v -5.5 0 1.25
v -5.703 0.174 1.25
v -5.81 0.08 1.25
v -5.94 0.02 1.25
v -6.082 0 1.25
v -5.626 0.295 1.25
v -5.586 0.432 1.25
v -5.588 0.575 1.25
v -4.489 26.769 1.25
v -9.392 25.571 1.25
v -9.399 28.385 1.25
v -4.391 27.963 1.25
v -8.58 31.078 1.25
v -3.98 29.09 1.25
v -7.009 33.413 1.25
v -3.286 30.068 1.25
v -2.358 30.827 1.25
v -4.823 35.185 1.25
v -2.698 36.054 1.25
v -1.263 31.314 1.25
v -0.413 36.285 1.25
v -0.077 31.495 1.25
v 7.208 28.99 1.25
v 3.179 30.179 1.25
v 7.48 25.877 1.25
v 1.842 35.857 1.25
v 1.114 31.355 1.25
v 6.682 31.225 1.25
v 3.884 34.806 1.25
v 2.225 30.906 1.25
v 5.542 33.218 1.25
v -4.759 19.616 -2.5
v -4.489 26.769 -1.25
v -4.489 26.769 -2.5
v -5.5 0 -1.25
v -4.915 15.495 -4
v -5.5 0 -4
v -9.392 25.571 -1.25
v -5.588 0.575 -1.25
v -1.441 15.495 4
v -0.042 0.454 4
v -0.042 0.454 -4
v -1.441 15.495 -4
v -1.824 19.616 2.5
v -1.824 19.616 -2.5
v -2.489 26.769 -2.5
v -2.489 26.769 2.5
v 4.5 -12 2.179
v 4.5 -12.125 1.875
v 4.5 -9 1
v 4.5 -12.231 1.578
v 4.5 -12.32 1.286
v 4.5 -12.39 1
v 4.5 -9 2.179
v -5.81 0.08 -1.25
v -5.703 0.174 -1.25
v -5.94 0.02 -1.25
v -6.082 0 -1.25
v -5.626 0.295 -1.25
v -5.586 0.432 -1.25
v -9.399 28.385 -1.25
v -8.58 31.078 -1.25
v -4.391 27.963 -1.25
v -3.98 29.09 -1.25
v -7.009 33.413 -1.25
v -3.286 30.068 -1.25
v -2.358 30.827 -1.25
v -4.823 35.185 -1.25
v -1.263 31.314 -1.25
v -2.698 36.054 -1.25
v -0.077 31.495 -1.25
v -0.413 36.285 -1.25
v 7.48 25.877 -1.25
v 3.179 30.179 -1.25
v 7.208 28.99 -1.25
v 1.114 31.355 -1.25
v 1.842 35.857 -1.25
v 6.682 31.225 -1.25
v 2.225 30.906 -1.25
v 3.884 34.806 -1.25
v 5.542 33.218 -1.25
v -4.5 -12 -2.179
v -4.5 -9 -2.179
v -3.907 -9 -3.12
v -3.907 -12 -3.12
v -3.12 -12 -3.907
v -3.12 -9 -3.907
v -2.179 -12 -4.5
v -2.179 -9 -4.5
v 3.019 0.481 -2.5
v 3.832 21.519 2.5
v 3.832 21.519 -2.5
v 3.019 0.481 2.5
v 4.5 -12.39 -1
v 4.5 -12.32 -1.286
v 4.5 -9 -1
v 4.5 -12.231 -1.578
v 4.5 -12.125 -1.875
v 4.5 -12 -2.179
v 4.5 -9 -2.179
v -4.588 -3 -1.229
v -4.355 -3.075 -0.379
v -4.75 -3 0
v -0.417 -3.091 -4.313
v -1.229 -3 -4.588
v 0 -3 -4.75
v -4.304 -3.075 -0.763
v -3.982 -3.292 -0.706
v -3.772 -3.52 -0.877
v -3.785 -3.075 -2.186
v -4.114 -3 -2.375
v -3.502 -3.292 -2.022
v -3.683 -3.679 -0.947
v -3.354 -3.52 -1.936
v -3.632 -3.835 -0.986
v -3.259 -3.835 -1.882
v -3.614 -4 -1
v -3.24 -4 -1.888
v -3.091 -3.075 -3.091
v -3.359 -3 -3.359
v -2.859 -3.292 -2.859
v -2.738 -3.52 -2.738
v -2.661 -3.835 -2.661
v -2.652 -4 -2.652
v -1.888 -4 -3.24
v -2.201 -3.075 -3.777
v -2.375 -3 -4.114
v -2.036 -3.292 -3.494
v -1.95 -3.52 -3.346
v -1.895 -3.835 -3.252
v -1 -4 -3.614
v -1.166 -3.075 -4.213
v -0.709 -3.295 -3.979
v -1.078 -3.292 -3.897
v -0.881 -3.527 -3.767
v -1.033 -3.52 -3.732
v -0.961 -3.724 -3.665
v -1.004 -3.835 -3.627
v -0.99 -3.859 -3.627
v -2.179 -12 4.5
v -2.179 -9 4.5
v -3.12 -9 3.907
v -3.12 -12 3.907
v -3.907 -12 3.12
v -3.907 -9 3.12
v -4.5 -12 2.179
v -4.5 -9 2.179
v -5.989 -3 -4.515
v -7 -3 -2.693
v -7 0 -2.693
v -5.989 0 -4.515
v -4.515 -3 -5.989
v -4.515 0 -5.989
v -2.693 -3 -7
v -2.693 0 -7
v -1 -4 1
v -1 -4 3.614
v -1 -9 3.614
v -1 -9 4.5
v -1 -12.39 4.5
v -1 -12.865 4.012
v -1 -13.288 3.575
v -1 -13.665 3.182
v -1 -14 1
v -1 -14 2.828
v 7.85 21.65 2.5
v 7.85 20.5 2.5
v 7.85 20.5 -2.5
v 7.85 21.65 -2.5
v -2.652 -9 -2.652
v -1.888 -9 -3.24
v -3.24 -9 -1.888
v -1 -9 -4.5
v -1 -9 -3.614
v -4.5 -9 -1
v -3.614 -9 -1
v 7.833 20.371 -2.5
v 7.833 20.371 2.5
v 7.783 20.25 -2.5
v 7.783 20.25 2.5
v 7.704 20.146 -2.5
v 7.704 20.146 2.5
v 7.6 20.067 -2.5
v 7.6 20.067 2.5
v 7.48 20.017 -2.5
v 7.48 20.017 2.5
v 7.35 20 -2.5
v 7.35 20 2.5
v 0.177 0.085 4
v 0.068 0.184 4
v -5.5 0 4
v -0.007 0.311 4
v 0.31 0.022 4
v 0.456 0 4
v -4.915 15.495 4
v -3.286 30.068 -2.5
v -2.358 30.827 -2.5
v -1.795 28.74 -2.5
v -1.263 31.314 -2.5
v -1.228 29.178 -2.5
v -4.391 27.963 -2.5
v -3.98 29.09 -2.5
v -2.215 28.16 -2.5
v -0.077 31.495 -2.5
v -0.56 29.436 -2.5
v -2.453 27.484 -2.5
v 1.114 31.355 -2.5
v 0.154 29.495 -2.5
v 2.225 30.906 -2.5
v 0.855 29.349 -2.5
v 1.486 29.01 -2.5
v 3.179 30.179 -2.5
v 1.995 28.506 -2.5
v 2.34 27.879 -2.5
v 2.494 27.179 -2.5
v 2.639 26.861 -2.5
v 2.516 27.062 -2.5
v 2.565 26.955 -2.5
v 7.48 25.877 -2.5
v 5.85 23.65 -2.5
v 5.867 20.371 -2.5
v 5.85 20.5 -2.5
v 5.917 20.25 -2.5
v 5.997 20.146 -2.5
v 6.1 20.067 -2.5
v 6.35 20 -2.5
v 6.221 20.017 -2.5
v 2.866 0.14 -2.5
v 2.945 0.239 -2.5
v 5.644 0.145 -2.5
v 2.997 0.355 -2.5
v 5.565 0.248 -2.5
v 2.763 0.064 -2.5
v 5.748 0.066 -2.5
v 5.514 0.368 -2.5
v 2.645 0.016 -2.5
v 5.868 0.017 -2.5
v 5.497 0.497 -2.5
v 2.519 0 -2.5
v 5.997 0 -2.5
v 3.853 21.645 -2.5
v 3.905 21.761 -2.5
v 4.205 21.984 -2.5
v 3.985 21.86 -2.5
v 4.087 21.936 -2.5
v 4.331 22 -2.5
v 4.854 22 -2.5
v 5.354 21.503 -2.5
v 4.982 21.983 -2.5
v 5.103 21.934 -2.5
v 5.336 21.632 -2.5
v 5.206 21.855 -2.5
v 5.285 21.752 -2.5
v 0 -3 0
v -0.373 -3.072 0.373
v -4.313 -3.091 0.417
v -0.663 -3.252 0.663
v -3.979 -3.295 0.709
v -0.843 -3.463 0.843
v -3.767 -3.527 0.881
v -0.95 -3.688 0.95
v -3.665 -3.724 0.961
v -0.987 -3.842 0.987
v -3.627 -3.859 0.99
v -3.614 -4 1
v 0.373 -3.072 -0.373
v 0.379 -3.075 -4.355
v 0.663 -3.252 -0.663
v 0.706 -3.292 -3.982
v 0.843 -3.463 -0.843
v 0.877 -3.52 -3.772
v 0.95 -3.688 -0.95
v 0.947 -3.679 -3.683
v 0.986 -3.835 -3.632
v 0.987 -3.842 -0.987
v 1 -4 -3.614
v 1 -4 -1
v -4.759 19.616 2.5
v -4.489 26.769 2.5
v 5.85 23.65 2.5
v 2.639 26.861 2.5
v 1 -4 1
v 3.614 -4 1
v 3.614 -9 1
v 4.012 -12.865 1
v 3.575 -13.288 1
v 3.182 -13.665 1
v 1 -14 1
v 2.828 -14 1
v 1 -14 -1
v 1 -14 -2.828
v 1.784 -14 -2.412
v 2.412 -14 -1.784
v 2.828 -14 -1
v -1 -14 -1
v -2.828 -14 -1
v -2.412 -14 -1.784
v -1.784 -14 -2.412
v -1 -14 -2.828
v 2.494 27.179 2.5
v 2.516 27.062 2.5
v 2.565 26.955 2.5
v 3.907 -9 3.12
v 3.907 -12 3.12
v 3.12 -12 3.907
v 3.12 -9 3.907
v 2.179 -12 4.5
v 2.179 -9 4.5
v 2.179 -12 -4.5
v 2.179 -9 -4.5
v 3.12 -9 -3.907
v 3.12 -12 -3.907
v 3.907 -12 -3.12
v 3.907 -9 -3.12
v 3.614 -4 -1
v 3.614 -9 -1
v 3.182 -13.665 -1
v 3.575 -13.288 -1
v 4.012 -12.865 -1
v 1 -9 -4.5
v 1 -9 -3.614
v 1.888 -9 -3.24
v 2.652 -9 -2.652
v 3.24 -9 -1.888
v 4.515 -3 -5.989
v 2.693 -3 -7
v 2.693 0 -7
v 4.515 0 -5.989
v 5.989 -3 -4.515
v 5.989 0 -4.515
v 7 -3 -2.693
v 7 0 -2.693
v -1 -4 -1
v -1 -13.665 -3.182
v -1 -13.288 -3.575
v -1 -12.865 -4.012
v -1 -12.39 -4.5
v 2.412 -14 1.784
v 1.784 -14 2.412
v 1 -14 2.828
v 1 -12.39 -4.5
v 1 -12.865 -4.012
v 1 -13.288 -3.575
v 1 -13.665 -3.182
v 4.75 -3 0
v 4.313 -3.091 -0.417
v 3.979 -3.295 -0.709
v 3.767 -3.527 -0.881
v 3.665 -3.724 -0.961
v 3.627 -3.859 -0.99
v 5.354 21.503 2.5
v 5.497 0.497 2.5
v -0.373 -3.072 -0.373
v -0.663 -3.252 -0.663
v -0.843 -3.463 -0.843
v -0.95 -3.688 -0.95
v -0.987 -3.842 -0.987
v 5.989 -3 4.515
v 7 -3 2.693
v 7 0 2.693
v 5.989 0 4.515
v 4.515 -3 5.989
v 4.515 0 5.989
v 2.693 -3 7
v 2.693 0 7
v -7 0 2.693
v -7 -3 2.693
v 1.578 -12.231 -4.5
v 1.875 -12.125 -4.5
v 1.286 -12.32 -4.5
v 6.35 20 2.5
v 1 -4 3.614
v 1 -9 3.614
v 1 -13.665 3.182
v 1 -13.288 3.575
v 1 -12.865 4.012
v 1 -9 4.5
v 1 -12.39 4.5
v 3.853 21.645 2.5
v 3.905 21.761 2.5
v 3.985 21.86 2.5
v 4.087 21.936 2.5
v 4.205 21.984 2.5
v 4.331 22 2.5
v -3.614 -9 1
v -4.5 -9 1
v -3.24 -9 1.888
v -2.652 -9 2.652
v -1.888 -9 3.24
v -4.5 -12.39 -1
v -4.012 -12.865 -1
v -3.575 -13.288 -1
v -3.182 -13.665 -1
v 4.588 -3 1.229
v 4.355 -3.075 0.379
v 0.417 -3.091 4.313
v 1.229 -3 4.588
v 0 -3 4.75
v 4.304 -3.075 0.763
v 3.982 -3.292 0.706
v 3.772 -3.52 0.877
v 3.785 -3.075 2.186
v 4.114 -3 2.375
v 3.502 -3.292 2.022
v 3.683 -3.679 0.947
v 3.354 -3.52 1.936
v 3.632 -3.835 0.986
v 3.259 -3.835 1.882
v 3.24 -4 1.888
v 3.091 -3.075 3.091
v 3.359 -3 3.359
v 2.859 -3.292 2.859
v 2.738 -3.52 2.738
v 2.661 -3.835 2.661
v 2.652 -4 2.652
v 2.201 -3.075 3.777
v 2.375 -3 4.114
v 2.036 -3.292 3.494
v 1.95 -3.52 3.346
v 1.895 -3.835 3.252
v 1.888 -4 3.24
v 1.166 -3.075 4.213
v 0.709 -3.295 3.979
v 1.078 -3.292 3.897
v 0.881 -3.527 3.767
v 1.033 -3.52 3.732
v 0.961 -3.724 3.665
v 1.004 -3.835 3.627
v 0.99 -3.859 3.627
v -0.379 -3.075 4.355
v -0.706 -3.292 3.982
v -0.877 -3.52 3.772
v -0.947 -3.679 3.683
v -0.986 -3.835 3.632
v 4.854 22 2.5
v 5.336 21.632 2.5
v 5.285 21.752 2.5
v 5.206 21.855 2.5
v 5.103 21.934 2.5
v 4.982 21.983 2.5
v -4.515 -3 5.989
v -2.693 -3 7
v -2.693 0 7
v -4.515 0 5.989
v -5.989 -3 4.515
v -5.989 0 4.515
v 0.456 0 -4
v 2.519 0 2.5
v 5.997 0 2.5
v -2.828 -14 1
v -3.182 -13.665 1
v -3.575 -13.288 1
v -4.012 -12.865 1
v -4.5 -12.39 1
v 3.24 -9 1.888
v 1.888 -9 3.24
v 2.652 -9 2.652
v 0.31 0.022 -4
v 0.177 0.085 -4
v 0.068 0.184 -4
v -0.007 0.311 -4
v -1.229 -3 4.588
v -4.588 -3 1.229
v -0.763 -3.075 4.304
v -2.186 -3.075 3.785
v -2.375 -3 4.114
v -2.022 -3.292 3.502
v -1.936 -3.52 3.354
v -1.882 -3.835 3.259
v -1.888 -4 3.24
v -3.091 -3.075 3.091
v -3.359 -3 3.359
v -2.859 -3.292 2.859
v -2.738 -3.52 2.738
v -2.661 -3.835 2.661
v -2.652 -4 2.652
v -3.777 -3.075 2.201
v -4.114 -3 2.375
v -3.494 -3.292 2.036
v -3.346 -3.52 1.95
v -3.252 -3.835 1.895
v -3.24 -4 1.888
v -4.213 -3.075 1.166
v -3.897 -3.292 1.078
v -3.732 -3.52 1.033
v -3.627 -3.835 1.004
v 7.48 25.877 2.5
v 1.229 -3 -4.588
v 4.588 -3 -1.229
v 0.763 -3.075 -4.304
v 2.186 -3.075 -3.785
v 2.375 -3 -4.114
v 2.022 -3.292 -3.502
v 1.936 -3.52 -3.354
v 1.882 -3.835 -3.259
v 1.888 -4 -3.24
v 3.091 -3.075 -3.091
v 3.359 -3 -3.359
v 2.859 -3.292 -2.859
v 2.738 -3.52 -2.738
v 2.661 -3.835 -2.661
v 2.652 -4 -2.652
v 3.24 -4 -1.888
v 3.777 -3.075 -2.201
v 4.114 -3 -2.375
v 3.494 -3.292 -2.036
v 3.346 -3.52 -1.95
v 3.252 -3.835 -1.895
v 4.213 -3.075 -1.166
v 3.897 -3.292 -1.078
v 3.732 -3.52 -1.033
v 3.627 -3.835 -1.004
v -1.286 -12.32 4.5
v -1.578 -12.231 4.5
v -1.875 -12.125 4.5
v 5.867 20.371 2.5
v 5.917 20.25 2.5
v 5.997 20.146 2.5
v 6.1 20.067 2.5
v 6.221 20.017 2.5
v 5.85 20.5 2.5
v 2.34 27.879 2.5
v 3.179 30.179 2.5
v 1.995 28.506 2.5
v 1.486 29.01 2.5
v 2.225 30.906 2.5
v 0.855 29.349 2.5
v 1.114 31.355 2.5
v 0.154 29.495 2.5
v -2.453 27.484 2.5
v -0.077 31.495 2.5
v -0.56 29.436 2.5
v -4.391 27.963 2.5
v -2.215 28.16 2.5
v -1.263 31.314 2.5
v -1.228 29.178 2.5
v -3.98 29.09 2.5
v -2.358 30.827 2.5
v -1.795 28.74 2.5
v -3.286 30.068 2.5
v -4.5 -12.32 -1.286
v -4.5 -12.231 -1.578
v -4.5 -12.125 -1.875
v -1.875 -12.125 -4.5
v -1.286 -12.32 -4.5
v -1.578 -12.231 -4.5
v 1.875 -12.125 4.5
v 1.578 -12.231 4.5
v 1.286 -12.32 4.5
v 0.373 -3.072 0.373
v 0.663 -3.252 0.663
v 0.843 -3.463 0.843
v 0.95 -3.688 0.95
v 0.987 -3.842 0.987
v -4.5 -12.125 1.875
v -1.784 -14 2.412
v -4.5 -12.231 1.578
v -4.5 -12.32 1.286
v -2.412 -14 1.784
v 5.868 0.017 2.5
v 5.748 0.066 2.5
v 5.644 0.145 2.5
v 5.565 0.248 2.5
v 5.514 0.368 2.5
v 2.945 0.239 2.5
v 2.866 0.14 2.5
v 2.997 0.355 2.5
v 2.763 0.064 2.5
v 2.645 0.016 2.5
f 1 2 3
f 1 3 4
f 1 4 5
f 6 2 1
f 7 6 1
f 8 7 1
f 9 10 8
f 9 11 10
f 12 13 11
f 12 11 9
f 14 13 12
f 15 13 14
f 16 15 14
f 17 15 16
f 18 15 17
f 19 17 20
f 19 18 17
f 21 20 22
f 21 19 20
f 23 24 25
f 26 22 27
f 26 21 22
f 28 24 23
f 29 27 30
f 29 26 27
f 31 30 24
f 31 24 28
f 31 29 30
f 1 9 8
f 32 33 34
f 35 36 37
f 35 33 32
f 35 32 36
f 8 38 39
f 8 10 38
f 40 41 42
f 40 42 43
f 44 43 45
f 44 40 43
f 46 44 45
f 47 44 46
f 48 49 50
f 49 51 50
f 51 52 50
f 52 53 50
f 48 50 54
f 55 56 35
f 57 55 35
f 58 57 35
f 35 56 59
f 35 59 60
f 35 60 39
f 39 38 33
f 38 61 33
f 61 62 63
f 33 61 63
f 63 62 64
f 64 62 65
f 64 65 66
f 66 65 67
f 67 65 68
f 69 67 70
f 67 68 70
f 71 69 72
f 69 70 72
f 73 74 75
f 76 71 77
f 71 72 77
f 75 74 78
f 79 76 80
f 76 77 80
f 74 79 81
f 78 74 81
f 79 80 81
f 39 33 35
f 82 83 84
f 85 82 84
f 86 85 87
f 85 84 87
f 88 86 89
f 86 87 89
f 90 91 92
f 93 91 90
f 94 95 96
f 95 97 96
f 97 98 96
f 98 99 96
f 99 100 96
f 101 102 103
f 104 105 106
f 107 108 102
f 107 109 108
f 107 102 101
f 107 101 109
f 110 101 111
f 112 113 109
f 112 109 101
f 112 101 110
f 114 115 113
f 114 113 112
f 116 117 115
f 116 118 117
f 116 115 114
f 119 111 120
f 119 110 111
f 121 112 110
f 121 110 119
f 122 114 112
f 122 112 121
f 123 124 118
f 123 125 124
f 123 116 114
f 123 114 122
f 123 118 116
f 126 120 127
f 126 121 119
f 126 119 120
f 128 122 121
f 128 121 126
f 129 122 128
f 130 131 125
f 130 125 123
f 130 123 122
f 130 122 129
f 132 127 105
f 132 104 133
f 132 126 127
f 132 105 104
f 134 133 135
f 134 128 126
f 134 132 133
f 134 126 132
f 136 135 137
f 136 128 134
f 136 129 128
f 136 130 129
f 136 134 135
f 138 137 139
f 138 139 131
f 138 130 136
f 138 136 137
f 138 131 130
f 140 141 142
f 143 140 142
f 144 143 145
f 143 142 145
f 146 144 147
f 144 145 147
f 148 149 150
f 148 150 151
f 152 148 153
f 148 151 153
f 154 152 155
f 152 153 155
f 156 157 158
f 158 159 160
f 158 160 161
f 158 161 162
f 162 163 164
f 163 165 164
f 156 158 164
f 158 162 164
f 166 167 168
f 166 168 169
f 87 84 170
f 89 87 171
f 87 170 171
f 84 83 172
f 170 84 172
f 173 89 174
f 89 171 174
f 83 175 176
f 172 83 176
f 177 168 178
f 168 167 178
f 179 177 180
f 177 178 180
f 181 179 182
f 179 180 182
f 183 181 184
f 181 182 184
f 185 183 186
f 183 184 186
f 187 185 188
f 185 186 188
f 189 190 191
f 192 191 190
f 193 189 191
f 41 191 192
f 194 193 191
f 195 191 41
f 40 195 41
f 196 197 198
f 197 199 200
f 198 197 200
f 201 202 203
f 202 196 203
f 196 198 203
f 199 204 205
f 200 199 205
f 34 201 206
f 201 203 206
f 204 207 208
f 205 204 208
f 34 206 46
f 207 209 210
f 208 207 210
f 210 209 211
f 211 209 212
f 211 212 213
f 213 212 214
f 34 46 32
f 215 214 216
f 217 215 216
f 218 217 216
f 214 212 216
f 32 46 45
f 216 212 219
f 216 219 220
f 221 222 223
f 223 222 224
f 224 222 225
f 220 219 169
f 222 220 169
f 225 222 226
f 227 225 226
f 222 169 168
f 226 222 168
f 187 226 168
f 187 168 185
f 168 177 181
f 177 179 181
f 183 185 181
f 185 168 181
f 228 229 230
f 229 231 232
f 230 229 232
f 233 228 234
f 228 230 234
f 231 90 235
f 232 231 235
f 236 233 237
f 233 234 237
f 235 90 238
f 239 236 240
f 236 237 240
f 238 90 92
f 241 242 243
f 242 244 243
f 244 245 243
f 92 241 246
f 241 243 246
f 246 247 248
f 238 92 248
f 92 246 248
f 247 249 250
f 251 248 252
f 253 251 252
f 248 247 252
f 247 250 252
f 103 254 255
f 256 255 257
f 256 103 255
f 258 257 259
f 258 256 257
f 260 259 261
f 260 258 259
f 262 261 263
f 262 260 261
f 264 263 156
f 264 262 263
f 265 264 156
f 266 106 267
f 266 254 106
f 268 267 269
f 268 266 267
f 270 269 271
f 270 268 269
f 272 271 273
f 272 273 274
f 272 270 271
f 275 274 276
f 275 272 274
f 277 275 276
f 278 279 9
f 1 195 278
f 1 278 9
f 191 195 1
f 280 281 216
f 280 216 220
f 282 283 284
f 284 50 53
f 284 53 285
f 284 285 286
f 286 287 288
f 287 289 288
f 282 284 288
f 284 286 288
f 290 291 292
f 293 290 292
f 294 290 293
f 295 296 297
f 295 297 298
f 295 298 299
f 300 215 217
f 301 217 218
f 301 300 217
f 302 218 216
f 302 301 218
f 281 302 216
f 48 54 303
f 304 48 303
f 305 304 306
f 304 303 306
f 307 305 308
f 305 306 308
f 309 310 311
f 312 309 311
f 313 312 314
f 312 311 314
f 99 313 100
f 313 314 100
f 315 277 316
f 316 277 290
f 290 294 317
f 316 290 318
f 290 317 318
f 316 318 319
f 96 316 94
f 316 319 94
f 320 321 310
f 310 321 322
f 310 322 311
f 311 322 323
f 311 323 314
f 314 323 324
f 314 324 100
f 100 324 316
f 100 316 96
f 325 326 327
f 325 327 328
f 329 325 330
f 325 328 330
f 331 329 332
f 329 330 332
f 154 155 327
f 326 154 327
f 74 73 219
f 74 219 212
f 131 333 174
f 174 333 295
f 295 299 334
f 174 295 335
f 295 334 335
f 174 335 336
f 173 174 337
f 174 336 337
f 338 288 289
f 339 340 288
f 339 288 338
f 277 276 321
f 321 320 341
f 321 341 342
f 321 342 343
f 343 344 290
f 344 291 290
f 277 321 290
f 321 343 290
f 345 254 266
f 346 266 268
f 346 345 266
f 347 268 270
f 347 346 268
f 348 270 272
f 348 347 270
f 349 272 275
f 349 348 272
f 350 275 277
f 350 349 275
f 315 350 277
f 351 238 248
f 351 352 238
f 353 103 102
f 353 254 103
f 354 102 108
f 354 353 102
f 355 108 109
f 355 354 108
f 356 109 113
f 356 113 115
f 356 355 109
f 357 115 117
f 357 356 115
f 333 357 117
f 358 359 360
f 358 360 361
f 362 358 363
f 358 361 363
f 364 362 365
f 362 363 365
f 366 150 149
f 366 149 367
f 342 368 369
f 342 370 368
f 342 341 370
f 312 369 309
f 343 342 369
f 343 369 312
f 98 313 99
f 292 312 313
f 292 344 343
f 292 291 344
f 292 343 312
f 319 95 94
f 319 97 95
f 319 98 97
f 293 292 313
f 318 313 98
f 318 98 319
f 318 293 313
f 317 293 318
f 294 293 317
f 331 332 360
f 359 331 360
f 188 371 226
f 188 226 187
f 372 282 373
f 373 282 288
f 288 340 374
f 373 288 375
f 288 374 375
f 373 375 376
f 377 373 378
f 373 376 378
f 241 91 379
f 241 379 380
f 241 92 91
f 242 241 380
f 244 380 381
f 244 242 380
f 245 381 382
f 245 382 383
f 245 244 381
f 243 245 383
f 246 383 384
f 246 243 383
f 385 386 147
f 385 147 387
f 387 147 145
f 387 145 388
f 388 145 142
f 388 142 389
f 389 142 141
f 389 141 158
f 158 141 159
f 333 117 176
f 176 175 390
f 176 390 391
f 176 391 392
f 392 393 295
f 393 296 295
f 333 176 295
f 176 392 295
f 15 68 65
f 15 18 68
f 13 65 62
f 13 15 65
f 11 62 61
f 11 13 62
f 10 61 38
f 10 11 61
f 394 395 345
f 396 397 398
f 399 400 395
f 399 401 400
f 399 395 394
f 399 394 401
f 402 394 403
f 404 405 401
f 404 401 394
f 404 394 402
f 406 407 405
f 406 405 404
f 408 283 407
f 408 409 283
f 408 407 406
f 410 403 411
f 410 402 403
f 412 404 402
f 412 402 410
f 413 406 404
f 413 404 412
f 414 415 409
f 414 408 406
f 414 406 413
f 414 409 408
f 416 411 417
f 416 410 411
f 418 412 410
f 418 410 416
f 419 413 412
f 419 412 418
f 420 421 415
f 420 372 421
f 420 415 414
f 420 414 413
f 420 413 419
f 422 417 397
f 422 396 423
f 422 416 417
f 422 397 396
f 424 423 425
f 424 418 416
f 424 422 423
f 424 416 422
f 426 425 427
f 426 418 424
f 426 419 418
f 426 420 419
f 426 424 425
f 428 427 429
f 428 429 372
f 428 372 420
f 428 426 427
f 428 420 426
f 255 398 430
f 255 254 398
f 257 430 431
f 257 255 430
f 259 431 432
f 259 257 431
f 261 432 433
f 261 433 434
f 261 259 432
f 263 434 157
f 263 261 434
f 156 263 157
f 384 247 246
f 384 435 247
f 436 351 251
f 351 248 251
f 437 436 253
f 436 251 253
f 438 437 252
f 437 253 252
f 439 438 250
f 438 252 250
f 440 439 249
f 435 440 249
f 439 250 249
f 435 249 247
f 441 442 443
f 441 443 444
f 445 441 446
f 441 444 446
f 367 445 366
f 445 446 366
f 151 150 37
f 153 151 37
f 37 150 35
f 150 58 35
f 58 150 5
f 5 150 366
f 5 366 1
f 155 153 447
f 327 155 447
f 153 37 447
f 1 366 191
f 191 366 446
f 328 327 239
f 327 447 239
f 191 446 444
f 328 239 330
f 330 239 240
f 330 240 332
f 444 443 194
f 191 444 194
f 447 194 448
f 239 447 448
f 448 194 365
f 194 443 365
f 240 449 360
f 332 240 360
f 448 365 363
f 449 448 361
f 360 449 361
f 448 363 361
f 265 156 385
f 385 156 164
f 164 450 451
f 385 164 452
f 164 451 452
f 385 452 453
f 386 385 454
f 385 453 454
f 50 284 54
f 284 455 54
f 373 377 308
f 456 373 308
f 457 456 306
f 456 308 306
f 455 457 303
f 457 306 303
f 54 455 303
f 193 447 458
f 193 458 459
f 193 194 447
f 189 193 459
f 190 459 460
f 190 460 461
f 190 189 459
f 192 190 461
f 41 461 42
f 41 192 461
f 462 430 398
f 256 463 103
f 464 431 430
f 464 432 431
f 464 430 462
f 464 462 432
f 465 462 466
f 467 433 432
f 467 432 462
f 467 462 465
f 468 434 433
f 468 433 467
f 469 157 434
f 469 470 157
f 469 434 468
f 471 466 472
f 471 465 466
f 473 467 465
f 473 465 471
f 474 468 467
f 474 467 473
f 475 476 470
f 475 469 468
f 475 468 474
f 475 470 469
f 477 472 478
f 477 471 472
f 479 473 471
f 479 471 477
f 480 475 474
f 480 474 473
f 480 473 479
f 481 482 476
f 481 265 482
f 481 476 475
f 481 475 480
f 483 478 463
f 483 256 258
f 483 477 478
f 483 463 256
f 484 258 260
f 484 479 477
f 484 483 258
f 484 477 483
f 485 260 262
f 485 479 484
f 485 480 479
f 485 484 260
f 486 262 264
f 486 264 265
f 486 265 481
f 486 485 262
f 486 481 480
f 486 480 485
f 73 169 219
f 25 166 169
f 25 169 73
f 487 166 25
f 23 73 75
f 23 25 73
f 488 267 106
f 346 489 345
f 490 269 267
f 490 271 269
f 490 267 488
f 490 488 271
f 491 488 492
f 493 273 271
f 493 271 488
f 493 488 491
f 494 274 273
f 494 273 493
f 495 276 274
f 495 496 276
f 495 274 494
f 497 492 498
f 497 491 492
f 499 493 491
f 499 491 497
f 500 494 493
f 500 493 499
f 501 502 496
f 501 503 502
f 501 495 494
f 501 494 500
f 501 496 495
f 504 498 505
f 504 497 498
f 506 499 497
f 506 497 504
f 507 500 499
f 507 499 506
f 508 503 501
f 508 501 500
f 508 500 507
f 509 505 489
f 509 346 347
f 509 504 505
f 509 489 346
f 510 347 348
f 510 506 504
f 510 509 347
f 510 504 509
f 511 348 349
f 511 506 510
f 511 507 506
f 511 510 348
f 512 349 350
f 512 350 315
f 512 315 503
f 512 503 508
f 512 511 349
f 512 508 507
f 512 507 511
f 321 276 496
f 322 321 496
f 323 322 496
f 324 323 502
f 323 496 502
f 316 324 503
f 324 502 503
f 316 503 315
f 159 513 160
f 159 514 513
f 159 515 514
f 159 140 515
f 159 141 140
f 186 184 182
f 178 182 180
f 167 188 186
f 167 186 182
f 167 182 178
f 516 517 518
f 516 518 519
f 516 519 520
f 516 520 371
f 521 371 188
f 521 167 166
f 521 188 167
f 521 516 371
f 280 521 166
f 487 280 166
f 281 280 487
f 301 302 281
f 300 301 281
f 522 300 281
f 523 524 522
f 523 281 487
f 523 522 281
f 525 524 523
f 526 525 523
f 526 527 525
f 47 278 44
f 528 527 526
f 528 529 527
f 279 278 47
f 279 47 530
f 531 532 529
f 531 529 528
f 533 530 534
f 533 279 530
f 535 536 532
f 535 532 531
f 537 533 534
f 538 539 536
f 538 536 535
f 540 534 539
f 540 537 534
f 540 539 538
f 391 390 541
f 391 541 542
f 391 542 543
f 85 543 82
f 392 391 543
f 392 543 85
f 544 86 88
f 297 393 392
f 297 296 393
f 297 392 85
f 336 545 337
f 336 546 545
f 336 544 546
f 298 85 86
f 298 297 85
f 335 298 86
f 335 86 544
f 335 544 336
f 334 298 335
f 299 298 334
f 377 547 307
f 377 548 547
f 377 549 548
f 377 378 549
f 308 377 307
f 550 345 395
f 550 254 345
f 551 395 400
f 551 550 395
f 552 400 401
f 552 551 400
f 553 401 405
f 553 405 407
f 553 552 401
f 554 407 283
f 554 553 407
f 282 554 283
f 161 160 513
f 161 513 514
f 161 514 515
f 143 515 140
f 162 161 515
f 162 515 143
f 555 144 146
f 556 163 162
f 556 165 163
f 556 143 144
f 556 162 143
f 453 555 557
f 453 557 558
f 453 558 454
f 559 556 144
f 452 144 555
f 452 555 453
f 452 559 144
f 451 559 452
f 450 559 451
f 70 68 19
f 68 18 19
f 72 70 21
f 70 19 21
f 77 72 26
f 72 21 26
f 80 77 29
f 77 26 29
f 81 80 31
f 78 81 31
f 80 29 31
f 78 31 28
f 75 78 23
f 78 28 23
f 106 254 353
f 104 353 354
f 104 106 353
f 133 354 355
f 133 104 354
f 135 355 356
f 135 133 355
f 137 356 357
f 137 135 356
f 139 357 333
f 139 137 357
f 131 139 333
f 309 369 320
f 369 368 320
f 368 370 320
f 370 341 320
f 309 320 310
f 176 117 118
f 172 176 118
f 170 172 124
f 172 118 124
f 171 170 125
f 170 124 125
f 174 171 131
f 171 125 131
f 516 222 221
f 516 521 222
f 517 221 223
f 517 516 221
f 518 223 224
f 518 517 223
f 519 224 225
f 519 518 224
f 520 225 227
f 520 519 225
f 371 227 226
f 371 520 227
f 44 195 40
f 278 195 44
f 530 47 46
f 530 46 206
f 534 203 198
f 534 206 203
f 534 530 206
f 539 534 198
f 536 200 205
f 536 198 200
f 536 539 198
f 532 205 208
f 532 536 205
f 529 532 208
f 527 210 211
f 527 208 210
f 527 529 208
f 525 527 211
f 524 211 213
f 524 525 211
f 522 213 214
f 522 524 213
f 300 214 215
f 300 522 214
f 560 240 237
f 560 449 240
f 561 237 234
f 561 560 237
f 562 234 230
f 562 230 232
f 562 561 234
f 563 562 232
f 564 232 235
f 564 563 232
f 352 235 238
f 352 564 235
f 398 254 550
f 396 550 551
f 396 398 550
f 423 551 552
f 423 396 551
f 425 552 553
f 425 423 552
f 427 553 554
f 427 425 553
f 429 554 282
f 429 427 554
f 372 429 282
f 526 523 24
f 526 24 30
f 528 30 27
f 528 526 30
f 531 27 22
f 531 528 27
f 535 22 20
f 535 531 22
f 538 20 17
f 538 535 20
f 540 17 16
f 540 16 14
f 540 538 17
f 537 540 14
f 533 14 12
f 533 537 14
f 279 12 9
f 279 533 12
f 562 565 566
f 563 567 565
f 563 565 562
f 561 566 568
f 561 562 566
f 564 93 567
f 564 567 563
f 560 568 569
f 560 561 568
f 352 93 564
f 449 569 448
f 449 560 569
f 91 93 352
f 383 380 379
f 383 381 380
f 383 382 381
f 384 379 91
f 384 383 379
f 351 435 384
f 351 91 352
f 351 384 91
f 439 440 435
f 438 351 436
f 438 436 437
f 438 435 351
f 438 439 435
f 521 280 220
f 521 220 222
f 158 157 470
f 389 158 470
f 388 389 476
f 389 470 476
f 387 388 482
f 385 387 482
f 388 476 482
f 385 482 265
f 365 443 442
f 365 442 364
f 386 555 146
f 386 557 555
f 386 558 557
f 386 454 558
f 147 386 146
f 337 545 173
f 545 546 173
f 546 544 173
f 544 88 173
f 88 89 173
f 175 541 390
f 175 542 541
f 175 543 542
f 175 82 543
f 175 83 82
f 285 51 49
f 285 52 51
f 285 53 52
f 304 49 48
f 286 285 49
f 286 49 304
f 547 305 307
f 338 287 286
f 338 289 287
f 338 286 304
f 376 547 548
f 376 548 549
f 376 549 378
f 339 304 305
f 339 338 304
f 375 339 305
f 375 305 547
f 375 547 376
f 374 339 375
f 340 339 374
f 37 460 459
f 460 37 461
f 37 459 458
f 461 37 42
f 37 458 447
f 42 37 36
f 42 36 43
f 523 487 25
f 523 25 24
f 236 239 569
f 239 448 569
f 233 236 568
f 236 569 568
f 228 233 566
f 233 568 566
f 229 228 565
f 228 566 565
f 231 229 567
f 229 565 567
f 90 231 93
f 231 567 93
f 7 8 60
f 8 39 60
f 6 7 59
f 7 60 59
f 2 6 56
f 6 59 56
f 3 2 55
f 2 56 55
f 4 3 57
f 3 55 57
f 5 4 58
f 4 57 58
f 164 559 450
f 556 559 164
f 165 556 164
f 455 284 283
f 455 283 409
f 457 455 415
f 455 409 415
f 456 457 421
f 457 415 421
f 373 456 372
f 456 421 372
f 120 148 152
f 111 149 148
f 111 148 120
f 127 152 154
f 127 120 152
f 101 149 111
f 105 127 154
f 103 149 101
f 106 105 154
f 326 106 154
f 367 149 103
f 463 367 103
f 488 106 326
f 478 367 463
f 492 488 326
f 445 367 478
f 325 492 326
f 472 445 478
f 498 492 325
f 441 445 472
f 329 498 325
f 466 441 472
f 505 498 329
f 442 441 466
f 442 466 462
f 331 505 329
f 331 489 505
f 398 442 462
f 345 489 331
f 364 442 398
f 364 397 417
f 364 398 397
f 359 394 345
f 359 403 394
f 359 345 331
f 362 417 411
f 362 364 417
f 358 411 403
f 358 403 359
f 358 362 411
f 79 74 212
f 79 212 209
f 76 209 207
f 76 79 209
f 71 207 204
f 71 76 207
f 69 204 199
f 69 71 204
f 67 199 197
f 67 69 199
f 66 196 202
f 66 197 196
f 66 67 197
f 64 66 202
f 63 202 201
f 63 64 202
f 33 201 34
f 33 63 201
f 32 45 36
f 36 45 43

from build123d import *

# Parameters (mm, degrees)
F1_DEPTH  = 1.25
F3_DEPTH  = 4
F4_R      = 7.5
F5_DEPTH  = 3
F7_DEPTH  = 2.5
F9_DEPTH  = 12.5
F10_R     = 3.75
F11_DEPTH = 6
F12_R     = 5
F13_DEPTH = 5
F14_SIZE  = 2
F16_DEPTH = 11
F17_R     = 8
F18_R     = 0.5
F19_W     = 20
F19_H     = 20
F19_W_2   = 9
F19_H_2   = 9
F20_DEPTH = 11.001
F21_R     = 0.99999
F22_W     = 20
F22_H     = 20
F22_W_2   = 14
F22_H_2   = 14
F23_DEPTH = 3


# Not quite as in the source:
# - a fillet or chamfer is up to 0.001 mm smaller than in the source, because OpenCascade refuses the exact size


with BuildPart() as f1:
    # F0 (on Top) → F1 (new body, symmetric)
    with BuildSketch(Plane.XY):
        with BuildLine():
            ThreePointArc((-2.4892601961, 26.7685185185), (-0.1158652446, 29.4973136057), (2.5, 27))
            Line((2.5, 27), (7.8501893912, 21.6498106088))
            Line((7.8501893912, 21.6498106088), (6.8018767371, 33.6320790747))
            ThreePointArc((6.8018767371, 33.6320790747), (-4.2336746433, 35.5044693553), (-9.391842346, 25.5705604779))
            Line((-9.391842346, 25.5705604779), (-5.5, 0))
            Line((-5.5, 0), (0, 0))
            Line((0, 0), (-2.4892601961, 26.7685185185))
        make_face()
    extrude(amount=F1_DEPTH, both=True)

    # F2 (on Top) → F3 (join, symmetric)
    with BuildSketch(Plane.XY):
        Polygon((-5.5, 0), (0, 0), (-2.4892601961, 26.7685185185), (-4.4892601961, 26.7685185185), align=None)
        with BuildLine():
            Line((-4.4892601961, 26.7685185185), (-2.4892601961, 26.7685185185))
            ThreePointArc((-2.4892601961, 26.7685185185), (-0.1158652446, 29.4973136057), (2.5, 27))
            Line((2.5, 27), (5.8501893912, 23.6498106088))
            Line((5.8501893912, 23.6498106088), (7.8501893912, 21.6498106088))
            Line((7.8501893912, 21.6498106088), (7.4803727359, 25.8768343213))
            Line((7.4803727359, 25.8768343213), (3.1786035286, 30.1786035286))
            ThreePointArc((3.1786035286, 30.1786035286), (-1.8266431422, 31.1073611498), (-4.4892601961, 26.7685185185))
        make_face()
        Polygon((7.8501893912, 21.6498106088), (5.8501893912, 23.6498106088), (5.8501893912, 20), (7.8501893912, 20), align=None)
    extrude(amount=F3_DEPTH, both=True)

    # F4 (on Front) → F5 (join)
    with BuildSketch(Plane.XZ):
        Circle(F4_R)
    extrude(amount=F5_DEPTH)

    # F6 (on Top) → F7 (join, symmetric)
    with BuildSketch(Plane.XY):
        Polygon((3.8501893912, 22), (3, 0), (5.5, 0), (5.3501893912, 22), align=None)
    extrude(amount=F7_DEPTH, both=True)

    # F8 (on Right) → F9 (cut, symmetric)
    with BuildSketch(Plane.YZ):
        Polygon((31.4952242196, 2.5), (31.4952242196, 4), (26.7685185185, 4), (15.4952242196, 4), (19.6164403488, 2.5), align=None)
        Polygon((26.7685185185, -4), (31.4952242196, -4), (31.4952242196, -2.5), (19.6164403488, -2.5), (15.4952242196, -4), align=None)
    extrude(amount=F9_DEPTH, both=True, mode=Mode.SUBTRACT)

    # F10 (on face) → F11 (join)
    with BuildSketch(Plane.XZ.offset(3)):
        Circle(F10_R)
    extrude(amount=F11_DEPTH)

    # F12 (on face) → F13 (join)
    with BuildSketch(Plane.XZ.offset(9)):
        Circle(F12_R)
    extrude(amount=F13_DEPTH)

    # F14
    f14_edges = [f1.edges().sort_by_distance(p)[0] for p in [
        (-5, -14, 0),
    ]]
    chamfer(f14_edges, length=F14_SIZE)

    # F15 (on face) → F16 (cut, through all)
    with BuildSketch(Plane.XZ.offset(14)):
        Polygon((1, 1), (1, 10), (-1, 10), (-1, 1), (-10, 1), (-10, -1), (-1, -1), (-1, -10), (1, -10), (1, -1), (10, -1), (10, 1), align=None)
    extrude(amount=-F16_DEPTH, mode=Mode.SUBTRACT)

    # F17
    f17_edges = [f1.edges().sort_by_distance(p)[0] for p in [
        (6.801877, 33.632079, 0),
    ]]
    fillet(f17_edges, radius=F17_R)

    # F18
    f18_edges = [f1.edges().sort_by_distance(p)[0] for p in [
        (5.850189, 20, 0),
        (7.850189, 20, 0),
        (5.350189, 22, 0),
        (3.850189, 22, 0),
        (2.5, 27, 0),
        (0, 0, 0),
        (5.5, 0, 0),
        (3, 0, 0),
        (-5.5, 0, 0),
    ]]
    fillet(f18_edges, radius=F18_R)

    # F19 (on face) → F20 (cut, through all)
    with BuildSketch(Plane.XZ.offset(3)):
        Rectangle(F19_W, F19_H)
        Rectangle(F19_W_2, F19_H_2, mode=Mode.SUBTRACT)
    extrude(amount=F20_DEPTH, mode=Mode.SUBTRACT)

    # F21 (radius 1 in the source; OpenCascade refuses exactly that, so slightly less here)
    f21_edges = [f1.edges().sort_by_distance(p)[0] for p in [
        (-2.65165, -3, -2.65165),
        (2.65165, -3, -2.65165),
        (2.65165, -3, 2.65165),
        (-2.65165, -3, 2.65165),
        (-1, -3, 2.307104),
        (1, -3, 2.307104),
        (2.307104, -3, 1),
        (-2.307104, -3, 1),
        (-2.307104, -3, -1),
        (2.307104, -3, -1),
        (-1, -3, -2.307104),
        (1, -3, -2.307104),
    ]]
    fillet(f21_edges, radius=F21_R)

    # F22 (on Front) → F23 (cut, through all)
    with BuildSketch(Plane.XZ):
        Rectangle(F22_W, F22_H)
        Rectangle(F22_W_2, F22_H_2, mode=Mode.SUBTRACT)
    extrude(amount=F23_DEPTH, mode=Mode.SUBTRACT)


solid = f1.part
